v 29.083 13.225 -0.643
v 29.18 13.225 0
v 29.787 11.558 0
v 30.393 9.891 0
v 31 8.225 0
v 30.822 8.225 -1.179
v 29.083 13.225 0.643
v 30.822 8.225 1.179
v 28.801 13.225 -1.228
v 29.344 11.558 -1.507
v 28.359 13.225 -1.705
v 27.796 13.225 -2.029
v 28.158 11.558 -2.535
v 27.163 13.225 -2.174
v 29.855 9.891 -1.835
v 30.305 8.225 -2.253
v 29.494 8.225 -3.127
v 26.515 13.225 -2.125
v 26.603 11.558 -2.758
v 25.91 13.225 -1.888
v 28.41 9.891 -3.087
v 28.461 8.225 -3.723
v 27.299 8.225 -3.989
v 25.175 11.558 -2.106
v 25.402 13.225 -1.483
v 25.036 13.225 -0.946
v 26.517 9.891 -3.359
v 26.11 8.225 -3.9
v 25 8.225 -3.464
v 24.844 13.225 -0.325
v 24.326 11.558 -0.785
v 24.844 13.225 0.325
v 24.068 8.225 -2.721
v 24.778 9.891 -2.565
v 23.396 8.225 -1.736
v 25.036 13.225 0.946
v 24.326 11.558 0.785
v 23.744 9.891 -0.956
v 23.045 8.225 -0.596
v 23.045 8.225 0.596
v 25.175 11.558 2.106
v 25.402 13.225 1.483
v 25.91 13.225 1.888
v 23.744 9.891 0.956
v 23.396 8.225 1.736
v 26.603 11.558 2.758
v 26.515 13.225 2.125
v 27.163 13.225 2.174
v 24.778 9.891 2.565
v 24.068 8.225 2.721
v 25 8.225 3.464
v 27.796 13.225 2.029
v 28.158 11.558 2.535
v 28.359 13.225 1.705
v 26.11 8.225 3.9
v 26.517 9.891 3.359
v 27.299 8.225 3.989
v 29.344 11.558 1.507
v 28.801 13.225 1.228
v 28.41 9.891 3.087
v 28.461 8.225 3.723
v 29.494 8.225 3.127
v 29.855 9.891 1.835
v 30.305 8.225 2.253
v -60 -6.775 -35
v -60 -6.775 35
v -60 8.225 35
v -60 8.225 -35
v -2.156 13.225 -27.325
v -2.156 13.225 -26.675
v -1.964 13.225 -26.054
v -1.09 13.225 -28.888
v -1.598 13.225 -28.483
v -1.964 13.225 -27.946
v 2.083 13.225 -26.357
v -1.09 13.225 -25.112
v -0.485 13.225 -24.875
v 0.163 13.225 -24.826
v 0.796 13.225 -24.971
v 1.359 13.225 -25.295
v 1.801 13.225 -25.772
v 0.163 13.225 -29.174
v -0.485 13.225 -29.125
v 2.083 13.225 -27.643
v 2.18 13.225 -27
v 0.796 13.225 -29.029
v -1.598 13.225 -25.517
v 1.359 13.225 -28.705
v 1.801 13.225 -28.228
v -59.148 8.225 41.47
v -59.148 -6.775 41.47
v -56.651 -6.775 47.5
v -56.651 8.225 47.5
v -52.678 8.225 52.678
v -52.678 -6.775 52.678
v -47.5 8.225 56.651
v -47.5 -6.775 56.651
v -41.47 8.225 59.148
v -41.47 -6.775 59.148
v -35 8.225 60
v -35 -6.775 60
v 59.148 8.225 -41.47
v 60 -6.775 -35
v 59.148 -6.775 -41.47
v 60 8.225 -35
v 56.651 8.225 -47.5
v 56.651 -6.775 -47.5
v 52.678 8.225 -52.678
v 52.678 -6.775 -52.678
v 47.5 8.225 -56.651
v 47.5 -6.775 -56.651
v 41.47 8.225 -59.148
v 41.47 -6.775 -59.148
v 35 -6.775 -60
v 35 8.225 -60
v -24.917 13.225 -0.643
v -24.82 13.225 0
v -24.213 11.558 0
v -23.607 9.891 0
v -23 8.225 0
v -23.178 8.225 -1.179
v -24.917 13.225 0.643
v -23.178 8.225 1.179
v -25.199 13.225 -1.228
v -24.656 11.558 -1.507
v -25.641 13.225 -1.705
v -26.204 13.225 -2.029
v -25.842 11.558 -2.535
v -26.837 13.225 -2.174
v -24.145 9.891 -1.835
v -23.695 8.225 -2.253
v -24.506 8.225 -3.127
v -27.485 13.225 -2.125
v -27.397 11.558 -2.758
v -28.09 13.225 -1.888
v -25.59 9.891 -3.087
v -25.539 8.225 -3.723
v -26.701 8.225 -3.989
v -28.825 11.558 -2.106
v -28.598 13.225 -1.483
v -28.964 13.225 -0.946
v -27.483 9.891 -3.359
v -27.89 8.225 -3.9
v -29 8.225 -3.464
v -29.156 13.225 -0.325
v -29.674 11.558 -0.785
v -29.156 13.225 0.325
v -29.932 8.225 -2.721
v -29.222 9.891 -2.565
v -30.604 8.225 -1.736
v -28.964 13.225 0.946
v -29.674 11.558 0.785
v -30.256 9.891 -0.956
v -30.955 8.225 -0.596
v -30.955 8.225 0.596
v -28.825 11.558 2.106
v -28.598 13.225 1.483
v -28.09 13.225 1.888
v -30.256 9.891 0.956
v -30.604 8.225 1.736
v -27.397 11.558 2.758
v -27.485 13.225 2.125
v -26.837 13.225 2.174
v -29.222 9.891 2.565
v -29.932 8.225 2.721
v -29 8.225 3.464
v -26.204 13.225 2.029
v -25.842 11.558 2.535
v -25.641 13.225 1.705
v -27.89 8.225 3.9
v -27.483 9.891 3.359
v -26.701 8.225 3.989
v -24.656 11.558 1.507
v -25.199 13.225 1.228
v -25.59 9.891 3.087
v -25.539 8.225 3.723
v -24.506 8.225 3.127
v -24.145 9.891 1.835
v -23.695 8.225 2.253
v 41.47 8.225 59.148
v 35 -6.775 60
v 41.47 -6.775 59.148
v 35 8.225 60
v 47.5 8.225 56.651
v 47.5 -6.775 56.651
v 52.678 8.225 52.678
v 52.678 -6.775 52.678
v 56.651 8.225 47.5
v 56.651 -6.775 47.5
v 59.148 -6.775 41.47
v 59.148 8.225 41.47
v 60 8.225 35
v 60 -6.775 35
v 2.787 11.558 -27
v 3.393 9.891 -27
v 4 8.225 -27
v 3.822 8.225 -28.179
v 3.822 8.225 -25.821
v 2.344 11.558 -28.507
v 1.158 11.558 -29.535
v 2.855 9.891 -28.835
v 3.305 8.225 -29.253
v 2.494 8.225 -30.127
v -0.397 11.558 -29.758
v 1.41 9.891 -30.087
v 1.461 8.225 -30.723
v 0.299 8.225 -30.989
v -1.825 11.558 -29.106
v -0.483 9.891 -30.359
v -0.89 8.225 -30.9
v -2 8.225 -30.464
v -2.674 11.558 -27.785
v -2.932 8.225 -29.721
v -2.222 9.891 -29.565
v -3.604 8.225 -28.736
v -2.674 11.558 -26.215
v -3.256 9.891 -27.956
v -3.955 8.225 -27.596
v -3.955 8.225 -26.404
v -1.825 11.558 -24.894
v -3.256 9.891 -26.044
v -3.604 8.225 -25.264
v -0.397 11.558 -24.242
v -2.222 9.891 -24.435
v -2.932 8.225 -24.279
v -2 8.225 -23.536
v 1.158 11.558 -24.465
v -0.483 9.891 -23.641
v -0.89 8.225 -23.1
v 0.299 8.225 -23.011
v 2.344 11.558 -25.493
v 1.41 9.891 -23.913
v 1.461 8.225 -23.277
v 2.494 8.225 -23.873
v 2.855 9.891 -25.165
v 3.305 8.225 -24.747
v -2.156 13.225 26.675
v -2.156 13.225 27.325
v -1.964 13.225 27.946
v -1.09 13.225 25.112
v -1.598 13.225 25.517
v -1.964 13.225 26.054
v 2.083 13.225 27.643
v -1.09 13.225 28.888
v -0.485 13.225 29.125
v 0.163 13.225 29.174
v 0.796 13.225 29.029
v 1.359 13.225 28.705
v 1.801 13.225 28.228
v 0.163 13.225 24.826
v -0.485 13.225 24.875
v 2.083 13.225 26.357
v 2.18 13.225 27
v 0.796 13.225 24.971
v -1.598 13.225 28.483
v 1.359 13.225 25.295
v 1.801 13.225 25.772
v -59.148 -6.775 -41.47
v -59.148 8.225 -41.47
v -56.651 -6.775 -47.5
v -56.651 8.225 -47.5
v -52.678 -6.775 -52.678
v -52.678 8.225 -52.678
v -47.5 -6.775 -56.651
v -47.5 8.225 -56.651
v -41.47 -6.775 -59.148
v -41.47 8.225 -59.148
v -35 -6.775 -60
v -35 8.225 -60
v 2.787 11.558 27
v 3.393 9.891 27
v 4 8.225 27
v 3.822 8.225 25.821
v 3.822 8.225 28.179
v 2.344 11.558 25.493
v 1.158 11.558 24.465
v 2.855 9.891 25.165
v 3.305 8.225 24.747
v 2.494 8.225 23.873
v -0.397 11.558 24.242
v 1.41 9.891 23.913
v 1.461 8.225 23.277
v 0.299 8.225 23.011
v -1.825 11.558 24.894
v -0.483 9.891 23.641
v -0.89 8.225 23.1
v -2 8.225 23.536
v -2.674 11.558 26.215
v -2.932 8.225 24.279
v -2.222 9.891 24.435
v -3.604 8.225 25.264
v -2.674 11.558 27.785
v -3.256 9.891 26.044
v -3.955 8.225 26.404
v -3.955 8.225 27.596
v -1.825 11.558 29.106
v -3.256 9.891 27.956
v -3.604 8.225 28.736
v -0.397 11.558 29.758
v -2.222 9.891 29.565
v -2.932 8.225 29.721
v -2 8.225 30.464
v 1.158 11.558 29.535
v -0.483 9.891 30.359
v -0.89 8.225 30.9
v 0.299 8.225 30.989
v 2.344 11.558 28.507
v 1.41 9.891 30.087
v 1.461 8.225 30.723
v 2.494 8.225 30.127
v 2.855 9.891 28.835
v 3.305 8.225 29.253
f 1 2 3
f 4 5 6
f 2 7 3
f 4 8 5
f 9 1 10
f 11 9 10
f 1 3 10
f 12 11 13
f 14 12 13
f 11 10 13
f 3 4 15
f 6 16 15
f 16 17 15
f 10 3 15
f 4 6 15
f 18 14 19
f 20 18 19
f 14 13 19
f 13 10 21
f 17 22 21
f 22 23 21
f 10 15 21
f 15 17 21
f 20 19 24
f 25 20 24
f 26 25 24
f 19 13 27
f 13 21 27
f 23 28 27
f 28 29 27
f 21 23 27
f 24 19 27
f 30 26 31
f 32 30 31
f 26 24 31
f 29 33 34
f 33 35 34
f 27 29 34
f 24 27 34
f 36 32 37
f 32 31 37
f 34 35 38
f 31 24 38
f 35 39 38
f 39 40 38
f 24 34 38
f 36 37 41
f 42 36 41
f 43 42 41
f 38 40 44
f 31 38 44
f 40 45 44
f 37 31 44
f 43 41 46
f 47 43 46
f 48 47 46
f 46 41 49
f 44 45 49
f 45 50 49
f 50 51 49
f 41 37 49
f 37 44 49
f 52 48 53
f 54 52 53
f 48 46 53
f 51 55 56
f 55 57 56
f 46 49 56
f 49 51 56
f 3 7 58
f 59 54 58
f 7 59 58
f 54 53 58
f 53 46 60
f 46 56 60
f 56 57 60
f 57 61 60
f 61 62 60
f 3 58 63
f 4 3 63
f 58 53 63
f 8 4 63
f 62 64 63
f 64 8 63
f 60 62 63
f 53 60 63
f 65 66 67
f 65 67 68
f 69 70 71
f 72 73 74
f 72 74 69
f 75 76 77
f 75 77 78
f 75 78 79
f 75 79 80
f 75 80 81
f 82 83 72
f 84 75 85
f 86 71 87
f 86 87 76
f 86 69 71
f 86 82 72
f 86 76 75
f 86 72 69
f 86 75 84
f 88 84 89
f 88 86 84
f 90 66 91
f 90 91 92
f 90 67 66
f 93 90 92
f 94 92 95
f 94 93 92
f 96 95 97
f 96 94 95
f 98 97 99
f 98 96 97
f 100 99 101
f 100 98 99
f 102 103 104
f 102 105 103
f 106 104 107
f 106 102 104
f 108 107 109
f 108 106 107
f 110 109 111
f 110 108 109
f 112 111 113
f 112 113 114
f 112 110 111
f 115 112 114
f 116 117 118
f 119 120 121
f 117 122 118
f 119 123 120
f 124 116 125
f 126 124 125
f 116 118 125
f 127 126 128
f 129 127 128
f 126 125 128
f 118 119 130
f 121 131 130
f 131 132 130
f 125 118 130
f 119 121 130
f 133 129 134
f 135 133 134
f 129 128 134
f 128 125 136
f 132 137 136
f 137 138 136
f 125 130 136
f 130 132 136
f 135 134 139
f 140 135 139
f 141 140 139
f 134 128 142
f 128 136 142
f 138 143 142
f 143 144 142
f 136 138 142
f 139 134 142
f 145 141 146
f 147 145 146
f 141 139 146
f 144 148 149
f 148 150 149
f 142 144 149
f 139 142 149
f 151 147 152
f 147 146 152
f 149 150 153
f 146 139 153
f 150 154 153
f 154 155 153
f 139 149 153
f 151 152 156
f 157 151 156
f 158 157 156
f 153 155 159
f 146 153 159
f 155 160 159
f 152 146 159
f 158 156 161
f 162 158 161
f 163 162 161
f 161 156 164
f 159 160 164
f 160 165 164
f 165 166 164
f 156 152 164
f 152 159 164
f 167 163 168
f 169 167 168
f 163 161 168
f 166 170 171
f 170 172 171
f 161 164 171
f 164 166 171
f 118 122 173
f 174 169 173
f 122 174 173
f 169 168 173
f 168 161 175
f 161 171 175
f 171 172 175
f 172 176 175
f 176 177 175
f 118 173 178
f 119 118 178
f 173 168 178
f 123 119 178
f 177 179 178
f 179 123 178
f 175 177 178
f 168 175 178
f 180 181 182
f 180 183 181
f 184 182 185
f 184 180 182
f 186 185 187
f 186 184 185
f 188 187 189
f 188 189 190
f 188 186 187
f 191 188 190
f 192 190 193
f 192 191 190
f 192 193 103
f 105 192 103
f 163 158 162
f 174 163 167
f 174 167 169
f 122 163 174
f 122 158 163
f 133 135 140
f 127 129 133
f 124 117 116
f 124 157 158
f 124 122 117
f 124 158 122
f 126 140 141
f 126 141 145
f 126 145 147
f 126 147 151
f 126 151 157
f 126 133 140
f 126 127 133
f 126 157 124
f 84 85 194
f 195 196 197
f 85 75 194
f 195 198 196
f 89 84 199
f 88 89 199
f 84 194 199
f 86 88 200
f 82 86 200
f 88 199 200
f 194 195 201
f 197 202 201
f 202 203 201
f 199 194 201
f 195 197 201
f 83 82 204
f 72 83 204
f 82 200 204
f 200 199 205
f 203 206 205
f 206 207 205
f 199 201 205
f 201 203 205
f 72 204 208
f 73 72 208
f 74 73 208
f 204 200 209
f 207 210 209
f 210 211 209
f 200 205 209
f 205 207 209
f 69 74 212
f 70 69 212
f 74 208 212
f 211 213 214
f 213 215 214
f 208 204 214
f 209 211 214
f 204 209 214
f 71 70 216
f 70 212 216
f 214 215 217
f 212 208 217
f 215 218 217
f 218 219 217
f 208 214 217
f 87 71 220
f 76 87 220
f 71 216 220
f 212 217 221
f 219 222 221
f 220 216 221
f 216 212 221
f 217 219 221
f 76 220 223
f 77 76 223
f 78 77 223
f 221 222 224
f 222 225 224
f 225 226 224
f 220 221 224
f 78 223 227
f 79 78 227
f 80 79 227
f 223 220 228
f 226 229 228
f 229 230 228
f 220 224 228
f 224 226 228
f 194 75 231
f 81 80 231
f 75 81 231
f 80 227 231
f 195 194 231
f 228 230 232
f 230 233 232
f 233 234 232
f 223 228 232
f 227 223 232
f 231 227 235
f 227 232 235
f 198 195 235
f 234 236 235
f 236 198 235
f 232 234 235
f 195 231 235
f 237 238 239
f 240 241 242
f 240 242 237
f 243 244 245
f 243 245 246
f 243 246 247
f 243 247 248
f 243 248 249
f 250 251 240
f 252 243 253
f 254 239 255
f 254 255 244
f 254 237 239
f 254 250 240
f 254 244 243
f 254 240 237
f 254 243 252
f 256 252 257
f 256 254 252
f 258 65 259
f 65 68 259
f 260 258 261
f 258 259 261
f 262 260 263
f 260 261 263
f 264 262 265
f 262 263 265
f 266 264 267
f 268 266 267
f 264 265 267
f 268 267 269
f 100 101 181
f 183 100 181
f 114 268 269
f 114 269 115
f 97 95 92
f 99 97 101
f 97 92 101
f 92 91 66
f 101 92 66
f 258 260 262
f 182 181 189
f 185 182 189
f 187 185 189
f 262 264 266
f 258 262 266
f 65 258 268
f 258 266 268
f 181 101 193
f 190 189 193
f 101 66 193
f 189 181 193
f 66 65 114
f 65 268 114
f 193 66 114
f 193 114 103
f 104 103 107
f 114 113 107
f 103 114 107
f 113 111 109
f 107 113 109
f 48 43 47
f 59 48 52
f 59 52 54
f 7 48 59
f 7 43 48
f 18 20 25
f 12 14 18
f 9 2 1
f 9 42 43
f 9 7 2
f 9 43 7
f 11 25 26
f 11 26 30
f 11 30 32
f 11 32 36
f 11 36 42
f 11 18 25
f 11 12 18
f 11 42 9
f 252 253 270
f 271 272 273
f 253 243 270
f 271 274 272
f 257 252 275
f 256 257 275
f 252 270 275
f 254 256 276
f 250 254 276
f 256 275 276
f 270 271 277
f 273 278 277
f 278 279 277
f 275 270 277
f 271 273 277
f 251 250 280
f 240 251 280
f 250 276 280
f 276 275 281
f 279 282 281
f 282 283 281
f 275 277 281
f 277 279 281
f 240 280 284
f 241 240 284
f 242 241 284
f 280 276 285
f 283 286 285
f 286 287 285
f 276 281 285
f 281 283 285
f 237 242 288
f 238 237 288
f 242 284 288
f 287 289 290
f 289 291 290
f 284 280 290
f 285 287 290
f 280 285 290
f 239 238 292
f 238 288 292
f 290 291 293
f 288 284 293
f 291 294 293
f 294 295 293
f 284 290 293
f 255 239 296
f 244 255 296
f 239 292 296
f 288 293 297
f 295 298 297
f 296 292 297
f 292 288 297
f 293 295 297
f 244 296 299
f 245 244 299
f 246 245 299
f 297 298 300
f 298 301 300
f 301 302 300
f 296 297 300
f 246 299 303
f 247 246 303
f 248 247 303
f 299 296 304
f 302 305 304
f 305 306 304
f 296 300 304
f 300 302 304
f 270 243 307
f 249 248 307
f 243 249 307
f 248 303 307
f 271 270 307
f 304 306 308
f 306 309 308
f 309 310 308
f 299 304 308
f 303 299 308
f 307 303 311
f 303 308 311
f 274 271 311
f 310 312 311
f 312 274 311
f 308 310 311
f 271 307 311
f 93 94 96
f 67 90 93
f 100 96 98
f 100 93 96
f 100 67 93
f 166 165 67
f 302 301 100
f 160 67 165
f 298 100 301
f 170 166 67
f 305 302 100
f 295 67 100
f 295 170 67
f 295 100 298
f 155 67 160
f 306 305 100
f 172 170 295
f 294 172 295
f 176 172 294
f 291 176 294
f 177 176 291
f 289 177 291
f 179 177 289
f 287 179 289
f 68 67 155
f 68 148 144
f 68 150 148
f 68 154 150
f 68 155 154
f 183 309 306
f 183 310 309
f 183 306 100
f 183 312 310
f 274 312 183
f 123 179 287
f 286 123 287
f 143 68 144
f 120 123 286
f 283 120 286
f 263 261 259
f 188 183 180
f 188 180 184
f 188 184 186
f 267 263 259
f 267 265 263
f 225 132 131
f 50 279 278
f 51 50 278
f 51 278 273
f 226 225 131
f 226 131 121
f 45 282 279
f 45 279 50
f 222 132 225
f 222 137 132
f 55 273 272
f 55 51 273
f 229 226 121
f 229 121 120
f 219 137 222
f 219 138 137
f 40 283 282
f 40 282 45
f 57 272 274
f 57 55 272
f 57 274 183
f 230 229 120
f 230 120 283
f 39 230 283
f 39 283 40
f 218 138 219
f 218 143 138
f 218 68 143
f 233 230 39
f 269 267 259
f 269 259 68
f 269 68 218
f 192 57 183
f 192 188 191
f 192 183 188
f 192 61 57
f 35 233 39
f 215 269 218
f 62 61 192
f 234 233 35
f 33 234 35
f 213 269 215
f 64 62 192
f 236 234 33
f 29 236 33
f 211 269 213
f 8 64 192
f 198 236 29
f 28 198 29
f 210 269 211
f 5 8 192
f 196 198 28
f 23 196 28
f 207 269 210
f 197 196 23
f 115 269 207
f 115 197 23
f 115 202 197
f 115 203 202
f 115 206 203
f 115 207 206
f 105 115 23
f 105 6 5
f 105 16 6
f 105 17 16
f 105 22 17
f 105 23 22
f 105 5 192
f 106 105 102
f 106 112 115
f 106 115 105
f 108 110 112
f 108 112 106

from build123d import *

# Parameters (mm, degrees)
CROQUIS2_W                        = 12
CROQUIS2_H                        = 12
PLATAFORMA_DEPTH                  = 1.5
REDONDEO3_R                       = 2.5
CROQUIS16_R                       = 0.4
SALIENTE_EXTRUIR7_DEPTH           = 0.5
SALIENTE_EXTRUIR7_DRAFT           = 20
SALIENTE_EXTRUIR7_PROFILE_2_DEPTH = 0.5
SALIENTE_EXTRUIR7_PROFILE_2_DRAFT = 20
SALIENTE_EXTRUIR7_PROFILE_3_DEPTH = 0.5
SALIENTE_EXTRUIR7_PROFILE_3_DRAFT = 20
SALIENTE_EXTRUIR7_PROFILE_4_DEPTH = 0.5
SALIENTE_EXTRUIR7_PROFILE_4_DRAFT = 20
ESCALA1_SCALE                     = 10


with BuildPart() as part:
    # Croquis2 → Plataforma (new body)
    with BuildSketch(Plane(origin=(0, 0, 0), x_dir=(1, 0, 0), z_dir=(0, 1, 0))):
        Rectangle(CROQUIS2_W, CROQUIS2_H)
    extrude(amount=PLATAFORMA_DEPTH)

    # Redondeo3
    redondeo3_edges = [part.edges().sort_by_distance(p)[0] for p in [
        (-6, 0.75, -6),
        (6, 0.75, -6),
        (6, 0.75, 6),
        (-6, 0.75, 6),
    ]]
    fillet(redondeo3_edges, radius=REDONDEO3_R)


with BuildPart() as saliente_extruir7_tool:
    # Croquis16 → Saliente-Extruir7 (with draft: the straight prism first)
    with BuildSketch(Plane(origin=(0, 1.5, 0), x_dir=(1, 0, 0), z_dir=(0, 1, 0))):
        with Locations((-2.7, 0)):
            Circle(CROQUIS16_R)
    extrude(amount=SALIENTE_EXTRUIR7_DEPTH)
    # Saliente-Extruir7: the draft: its side faces are tilted about the plane it starts from
    saliente_extruir7_sides = [saliente_extruir7_tool.faces().sort_by_distance(p)[0] for p in [
        (-3.1, 1.75, 0),
    ]]
    draft(saliente_extruir7_sides, Plane(origin=(0, 1.5, 0), x_dir=(1, 0, 0), z_dir=(0, 1, 0)), SALIENTE_EXTRUIR7_DRAFT)


with BuildPart() as part_1:
    add(part.part)

    # Saliente-Extruir7: add saliente_extruir7_tool
    add(saliente_extruir7_tool.part)


with BuildPart() as saliente_extruir7_profile_2_tool:
    # Croquis16 → Saliente-Extruir7 profile 2 (with draft: the straight prism first)
    with BuildSketch(Plane(origin=(0, 1.5, 0), x_dir=(1, 0, 0), z_dir=(0, 1, 0))):
        with Locations((0, -2.7)):
            Circle(CROQUIS16_R)
    extrude(amount=SALIENTE_EXTRUIR7_PROFILE_2_DEPTH)
    # Saliente-Extruir7 profile 2: the draft: its side faces are tilted about the plane it starts from
    saliente_extruir7_profile_2_sides = [saliente_extruir7_profile_2_tool.faces().sort_by_distance(p)[0] for p in [
        (-0.4, 1.75, 2.7),
    ]]
    draft(saliente_extruir7_profile_2_sides, Plane(origin=(0, 1.5, 0), x_dir=(1, 0, 0), z_dir=(0, 1, 0)), SALIENTE_EXTRUIR7_PROFILE_2_DRAFT)


with BuildPart() as part_2:
    add(part_1.part)

    # Saliente-Extruir7 profile 2: add saliente_extruir7_profile_2_tool
    add(saliente_extruir7_profile_2_tool.part)


with BuildPart() as saliente_extruir7_profile_3_tool:
    # Croquis16 → Saliente-Extruir7 profile 3 (with draft: the straight prism first)
    with BuildSketch(Plane(origin=(0, 1.5, 0), x_dir=(1, 0, 0), z_dir=(0, 1, 0))):
        with Locations((2.7, 0)):
            Circle(CROQUIS16_R)
    extrude(amount=SALIENTE_EXTRUIR7_PROFILE_3_DEPTH)
    # Saliente-Extruir7 profile 3: the draft: its side faces are tilted about the plane it starts from
    saliente_extruir7_profile_3_sides = [saliente_extruir7_profile_3_tool.faces().sort_by_distance(p)[0] for p in [
        (2.3, 1.75, 0),
    ]]
    draft(saliente_extruir7_profile_3_sides, Plane(origin=(0, 1.5, 0), x_dir=(1, 0, 0), z_dir=(0, 1, 0)), SALIENTE_EXTRUIR7_PROFILE_3_DRAFT)


with BuildPart() as part_3:
    add(part_2.part)

    # Saliente-Extruir7 profile 3: add saliente_extruir7_profile_3_tool
    add(saliente_extruir7_profile_3_tool.part)


with BuildPart() as saliente_extruir7_profile_4_tool:
    # Croquis16 → Saliente-Extruir7 profile 4 (with draft: the straight prism first)
    with BuildSketch(Plane(origin=(0, 1.5, 0), x_dir=(1, 0, 0), z_dir=(0, 1, 0))):
        with Locations((0, 2.7)):
            Circle(CROQUIS16_R)
    extrude(amount=SALIENTE_EXTRUIR7_PROFILE_4_DEPTH)
    # Saliente-Extruir7 profile 4: the draft: its side faces are tilted about the plane it starts from
    saliente_extruir7_profile_4_sides = [saliente_extruir7_profile_4_tool.faces().sort_by_distance(p)[0] for p in [
        (-0.4, 1.75, -2.7),
    ]]
    draft(saliente_extruir7_profile_4_sides, Plane(origin=(0, 1.5, 0), x_dir=(1, 0, 0), z_dir=(0, 1, 0)), SALIENTE_EXTRUIR7_PROFILE_4_DRAFT)


with BuildPart() as part_4:
    add(part_3.part)

    # Saliente-Extruir7 profile 4: add saliente_extruir7_profile_4_tool
    add(saliente_extruir7_profile_4_tool.part)


with BuildPart() as part_5:
    # Escala1: scaled about (0, 0.752818482, 0)
    add(part_4.part.scale(ESCALA1_SCALE).moved(Location((0, -6.775366338, 0))))


solid = part_5.part
